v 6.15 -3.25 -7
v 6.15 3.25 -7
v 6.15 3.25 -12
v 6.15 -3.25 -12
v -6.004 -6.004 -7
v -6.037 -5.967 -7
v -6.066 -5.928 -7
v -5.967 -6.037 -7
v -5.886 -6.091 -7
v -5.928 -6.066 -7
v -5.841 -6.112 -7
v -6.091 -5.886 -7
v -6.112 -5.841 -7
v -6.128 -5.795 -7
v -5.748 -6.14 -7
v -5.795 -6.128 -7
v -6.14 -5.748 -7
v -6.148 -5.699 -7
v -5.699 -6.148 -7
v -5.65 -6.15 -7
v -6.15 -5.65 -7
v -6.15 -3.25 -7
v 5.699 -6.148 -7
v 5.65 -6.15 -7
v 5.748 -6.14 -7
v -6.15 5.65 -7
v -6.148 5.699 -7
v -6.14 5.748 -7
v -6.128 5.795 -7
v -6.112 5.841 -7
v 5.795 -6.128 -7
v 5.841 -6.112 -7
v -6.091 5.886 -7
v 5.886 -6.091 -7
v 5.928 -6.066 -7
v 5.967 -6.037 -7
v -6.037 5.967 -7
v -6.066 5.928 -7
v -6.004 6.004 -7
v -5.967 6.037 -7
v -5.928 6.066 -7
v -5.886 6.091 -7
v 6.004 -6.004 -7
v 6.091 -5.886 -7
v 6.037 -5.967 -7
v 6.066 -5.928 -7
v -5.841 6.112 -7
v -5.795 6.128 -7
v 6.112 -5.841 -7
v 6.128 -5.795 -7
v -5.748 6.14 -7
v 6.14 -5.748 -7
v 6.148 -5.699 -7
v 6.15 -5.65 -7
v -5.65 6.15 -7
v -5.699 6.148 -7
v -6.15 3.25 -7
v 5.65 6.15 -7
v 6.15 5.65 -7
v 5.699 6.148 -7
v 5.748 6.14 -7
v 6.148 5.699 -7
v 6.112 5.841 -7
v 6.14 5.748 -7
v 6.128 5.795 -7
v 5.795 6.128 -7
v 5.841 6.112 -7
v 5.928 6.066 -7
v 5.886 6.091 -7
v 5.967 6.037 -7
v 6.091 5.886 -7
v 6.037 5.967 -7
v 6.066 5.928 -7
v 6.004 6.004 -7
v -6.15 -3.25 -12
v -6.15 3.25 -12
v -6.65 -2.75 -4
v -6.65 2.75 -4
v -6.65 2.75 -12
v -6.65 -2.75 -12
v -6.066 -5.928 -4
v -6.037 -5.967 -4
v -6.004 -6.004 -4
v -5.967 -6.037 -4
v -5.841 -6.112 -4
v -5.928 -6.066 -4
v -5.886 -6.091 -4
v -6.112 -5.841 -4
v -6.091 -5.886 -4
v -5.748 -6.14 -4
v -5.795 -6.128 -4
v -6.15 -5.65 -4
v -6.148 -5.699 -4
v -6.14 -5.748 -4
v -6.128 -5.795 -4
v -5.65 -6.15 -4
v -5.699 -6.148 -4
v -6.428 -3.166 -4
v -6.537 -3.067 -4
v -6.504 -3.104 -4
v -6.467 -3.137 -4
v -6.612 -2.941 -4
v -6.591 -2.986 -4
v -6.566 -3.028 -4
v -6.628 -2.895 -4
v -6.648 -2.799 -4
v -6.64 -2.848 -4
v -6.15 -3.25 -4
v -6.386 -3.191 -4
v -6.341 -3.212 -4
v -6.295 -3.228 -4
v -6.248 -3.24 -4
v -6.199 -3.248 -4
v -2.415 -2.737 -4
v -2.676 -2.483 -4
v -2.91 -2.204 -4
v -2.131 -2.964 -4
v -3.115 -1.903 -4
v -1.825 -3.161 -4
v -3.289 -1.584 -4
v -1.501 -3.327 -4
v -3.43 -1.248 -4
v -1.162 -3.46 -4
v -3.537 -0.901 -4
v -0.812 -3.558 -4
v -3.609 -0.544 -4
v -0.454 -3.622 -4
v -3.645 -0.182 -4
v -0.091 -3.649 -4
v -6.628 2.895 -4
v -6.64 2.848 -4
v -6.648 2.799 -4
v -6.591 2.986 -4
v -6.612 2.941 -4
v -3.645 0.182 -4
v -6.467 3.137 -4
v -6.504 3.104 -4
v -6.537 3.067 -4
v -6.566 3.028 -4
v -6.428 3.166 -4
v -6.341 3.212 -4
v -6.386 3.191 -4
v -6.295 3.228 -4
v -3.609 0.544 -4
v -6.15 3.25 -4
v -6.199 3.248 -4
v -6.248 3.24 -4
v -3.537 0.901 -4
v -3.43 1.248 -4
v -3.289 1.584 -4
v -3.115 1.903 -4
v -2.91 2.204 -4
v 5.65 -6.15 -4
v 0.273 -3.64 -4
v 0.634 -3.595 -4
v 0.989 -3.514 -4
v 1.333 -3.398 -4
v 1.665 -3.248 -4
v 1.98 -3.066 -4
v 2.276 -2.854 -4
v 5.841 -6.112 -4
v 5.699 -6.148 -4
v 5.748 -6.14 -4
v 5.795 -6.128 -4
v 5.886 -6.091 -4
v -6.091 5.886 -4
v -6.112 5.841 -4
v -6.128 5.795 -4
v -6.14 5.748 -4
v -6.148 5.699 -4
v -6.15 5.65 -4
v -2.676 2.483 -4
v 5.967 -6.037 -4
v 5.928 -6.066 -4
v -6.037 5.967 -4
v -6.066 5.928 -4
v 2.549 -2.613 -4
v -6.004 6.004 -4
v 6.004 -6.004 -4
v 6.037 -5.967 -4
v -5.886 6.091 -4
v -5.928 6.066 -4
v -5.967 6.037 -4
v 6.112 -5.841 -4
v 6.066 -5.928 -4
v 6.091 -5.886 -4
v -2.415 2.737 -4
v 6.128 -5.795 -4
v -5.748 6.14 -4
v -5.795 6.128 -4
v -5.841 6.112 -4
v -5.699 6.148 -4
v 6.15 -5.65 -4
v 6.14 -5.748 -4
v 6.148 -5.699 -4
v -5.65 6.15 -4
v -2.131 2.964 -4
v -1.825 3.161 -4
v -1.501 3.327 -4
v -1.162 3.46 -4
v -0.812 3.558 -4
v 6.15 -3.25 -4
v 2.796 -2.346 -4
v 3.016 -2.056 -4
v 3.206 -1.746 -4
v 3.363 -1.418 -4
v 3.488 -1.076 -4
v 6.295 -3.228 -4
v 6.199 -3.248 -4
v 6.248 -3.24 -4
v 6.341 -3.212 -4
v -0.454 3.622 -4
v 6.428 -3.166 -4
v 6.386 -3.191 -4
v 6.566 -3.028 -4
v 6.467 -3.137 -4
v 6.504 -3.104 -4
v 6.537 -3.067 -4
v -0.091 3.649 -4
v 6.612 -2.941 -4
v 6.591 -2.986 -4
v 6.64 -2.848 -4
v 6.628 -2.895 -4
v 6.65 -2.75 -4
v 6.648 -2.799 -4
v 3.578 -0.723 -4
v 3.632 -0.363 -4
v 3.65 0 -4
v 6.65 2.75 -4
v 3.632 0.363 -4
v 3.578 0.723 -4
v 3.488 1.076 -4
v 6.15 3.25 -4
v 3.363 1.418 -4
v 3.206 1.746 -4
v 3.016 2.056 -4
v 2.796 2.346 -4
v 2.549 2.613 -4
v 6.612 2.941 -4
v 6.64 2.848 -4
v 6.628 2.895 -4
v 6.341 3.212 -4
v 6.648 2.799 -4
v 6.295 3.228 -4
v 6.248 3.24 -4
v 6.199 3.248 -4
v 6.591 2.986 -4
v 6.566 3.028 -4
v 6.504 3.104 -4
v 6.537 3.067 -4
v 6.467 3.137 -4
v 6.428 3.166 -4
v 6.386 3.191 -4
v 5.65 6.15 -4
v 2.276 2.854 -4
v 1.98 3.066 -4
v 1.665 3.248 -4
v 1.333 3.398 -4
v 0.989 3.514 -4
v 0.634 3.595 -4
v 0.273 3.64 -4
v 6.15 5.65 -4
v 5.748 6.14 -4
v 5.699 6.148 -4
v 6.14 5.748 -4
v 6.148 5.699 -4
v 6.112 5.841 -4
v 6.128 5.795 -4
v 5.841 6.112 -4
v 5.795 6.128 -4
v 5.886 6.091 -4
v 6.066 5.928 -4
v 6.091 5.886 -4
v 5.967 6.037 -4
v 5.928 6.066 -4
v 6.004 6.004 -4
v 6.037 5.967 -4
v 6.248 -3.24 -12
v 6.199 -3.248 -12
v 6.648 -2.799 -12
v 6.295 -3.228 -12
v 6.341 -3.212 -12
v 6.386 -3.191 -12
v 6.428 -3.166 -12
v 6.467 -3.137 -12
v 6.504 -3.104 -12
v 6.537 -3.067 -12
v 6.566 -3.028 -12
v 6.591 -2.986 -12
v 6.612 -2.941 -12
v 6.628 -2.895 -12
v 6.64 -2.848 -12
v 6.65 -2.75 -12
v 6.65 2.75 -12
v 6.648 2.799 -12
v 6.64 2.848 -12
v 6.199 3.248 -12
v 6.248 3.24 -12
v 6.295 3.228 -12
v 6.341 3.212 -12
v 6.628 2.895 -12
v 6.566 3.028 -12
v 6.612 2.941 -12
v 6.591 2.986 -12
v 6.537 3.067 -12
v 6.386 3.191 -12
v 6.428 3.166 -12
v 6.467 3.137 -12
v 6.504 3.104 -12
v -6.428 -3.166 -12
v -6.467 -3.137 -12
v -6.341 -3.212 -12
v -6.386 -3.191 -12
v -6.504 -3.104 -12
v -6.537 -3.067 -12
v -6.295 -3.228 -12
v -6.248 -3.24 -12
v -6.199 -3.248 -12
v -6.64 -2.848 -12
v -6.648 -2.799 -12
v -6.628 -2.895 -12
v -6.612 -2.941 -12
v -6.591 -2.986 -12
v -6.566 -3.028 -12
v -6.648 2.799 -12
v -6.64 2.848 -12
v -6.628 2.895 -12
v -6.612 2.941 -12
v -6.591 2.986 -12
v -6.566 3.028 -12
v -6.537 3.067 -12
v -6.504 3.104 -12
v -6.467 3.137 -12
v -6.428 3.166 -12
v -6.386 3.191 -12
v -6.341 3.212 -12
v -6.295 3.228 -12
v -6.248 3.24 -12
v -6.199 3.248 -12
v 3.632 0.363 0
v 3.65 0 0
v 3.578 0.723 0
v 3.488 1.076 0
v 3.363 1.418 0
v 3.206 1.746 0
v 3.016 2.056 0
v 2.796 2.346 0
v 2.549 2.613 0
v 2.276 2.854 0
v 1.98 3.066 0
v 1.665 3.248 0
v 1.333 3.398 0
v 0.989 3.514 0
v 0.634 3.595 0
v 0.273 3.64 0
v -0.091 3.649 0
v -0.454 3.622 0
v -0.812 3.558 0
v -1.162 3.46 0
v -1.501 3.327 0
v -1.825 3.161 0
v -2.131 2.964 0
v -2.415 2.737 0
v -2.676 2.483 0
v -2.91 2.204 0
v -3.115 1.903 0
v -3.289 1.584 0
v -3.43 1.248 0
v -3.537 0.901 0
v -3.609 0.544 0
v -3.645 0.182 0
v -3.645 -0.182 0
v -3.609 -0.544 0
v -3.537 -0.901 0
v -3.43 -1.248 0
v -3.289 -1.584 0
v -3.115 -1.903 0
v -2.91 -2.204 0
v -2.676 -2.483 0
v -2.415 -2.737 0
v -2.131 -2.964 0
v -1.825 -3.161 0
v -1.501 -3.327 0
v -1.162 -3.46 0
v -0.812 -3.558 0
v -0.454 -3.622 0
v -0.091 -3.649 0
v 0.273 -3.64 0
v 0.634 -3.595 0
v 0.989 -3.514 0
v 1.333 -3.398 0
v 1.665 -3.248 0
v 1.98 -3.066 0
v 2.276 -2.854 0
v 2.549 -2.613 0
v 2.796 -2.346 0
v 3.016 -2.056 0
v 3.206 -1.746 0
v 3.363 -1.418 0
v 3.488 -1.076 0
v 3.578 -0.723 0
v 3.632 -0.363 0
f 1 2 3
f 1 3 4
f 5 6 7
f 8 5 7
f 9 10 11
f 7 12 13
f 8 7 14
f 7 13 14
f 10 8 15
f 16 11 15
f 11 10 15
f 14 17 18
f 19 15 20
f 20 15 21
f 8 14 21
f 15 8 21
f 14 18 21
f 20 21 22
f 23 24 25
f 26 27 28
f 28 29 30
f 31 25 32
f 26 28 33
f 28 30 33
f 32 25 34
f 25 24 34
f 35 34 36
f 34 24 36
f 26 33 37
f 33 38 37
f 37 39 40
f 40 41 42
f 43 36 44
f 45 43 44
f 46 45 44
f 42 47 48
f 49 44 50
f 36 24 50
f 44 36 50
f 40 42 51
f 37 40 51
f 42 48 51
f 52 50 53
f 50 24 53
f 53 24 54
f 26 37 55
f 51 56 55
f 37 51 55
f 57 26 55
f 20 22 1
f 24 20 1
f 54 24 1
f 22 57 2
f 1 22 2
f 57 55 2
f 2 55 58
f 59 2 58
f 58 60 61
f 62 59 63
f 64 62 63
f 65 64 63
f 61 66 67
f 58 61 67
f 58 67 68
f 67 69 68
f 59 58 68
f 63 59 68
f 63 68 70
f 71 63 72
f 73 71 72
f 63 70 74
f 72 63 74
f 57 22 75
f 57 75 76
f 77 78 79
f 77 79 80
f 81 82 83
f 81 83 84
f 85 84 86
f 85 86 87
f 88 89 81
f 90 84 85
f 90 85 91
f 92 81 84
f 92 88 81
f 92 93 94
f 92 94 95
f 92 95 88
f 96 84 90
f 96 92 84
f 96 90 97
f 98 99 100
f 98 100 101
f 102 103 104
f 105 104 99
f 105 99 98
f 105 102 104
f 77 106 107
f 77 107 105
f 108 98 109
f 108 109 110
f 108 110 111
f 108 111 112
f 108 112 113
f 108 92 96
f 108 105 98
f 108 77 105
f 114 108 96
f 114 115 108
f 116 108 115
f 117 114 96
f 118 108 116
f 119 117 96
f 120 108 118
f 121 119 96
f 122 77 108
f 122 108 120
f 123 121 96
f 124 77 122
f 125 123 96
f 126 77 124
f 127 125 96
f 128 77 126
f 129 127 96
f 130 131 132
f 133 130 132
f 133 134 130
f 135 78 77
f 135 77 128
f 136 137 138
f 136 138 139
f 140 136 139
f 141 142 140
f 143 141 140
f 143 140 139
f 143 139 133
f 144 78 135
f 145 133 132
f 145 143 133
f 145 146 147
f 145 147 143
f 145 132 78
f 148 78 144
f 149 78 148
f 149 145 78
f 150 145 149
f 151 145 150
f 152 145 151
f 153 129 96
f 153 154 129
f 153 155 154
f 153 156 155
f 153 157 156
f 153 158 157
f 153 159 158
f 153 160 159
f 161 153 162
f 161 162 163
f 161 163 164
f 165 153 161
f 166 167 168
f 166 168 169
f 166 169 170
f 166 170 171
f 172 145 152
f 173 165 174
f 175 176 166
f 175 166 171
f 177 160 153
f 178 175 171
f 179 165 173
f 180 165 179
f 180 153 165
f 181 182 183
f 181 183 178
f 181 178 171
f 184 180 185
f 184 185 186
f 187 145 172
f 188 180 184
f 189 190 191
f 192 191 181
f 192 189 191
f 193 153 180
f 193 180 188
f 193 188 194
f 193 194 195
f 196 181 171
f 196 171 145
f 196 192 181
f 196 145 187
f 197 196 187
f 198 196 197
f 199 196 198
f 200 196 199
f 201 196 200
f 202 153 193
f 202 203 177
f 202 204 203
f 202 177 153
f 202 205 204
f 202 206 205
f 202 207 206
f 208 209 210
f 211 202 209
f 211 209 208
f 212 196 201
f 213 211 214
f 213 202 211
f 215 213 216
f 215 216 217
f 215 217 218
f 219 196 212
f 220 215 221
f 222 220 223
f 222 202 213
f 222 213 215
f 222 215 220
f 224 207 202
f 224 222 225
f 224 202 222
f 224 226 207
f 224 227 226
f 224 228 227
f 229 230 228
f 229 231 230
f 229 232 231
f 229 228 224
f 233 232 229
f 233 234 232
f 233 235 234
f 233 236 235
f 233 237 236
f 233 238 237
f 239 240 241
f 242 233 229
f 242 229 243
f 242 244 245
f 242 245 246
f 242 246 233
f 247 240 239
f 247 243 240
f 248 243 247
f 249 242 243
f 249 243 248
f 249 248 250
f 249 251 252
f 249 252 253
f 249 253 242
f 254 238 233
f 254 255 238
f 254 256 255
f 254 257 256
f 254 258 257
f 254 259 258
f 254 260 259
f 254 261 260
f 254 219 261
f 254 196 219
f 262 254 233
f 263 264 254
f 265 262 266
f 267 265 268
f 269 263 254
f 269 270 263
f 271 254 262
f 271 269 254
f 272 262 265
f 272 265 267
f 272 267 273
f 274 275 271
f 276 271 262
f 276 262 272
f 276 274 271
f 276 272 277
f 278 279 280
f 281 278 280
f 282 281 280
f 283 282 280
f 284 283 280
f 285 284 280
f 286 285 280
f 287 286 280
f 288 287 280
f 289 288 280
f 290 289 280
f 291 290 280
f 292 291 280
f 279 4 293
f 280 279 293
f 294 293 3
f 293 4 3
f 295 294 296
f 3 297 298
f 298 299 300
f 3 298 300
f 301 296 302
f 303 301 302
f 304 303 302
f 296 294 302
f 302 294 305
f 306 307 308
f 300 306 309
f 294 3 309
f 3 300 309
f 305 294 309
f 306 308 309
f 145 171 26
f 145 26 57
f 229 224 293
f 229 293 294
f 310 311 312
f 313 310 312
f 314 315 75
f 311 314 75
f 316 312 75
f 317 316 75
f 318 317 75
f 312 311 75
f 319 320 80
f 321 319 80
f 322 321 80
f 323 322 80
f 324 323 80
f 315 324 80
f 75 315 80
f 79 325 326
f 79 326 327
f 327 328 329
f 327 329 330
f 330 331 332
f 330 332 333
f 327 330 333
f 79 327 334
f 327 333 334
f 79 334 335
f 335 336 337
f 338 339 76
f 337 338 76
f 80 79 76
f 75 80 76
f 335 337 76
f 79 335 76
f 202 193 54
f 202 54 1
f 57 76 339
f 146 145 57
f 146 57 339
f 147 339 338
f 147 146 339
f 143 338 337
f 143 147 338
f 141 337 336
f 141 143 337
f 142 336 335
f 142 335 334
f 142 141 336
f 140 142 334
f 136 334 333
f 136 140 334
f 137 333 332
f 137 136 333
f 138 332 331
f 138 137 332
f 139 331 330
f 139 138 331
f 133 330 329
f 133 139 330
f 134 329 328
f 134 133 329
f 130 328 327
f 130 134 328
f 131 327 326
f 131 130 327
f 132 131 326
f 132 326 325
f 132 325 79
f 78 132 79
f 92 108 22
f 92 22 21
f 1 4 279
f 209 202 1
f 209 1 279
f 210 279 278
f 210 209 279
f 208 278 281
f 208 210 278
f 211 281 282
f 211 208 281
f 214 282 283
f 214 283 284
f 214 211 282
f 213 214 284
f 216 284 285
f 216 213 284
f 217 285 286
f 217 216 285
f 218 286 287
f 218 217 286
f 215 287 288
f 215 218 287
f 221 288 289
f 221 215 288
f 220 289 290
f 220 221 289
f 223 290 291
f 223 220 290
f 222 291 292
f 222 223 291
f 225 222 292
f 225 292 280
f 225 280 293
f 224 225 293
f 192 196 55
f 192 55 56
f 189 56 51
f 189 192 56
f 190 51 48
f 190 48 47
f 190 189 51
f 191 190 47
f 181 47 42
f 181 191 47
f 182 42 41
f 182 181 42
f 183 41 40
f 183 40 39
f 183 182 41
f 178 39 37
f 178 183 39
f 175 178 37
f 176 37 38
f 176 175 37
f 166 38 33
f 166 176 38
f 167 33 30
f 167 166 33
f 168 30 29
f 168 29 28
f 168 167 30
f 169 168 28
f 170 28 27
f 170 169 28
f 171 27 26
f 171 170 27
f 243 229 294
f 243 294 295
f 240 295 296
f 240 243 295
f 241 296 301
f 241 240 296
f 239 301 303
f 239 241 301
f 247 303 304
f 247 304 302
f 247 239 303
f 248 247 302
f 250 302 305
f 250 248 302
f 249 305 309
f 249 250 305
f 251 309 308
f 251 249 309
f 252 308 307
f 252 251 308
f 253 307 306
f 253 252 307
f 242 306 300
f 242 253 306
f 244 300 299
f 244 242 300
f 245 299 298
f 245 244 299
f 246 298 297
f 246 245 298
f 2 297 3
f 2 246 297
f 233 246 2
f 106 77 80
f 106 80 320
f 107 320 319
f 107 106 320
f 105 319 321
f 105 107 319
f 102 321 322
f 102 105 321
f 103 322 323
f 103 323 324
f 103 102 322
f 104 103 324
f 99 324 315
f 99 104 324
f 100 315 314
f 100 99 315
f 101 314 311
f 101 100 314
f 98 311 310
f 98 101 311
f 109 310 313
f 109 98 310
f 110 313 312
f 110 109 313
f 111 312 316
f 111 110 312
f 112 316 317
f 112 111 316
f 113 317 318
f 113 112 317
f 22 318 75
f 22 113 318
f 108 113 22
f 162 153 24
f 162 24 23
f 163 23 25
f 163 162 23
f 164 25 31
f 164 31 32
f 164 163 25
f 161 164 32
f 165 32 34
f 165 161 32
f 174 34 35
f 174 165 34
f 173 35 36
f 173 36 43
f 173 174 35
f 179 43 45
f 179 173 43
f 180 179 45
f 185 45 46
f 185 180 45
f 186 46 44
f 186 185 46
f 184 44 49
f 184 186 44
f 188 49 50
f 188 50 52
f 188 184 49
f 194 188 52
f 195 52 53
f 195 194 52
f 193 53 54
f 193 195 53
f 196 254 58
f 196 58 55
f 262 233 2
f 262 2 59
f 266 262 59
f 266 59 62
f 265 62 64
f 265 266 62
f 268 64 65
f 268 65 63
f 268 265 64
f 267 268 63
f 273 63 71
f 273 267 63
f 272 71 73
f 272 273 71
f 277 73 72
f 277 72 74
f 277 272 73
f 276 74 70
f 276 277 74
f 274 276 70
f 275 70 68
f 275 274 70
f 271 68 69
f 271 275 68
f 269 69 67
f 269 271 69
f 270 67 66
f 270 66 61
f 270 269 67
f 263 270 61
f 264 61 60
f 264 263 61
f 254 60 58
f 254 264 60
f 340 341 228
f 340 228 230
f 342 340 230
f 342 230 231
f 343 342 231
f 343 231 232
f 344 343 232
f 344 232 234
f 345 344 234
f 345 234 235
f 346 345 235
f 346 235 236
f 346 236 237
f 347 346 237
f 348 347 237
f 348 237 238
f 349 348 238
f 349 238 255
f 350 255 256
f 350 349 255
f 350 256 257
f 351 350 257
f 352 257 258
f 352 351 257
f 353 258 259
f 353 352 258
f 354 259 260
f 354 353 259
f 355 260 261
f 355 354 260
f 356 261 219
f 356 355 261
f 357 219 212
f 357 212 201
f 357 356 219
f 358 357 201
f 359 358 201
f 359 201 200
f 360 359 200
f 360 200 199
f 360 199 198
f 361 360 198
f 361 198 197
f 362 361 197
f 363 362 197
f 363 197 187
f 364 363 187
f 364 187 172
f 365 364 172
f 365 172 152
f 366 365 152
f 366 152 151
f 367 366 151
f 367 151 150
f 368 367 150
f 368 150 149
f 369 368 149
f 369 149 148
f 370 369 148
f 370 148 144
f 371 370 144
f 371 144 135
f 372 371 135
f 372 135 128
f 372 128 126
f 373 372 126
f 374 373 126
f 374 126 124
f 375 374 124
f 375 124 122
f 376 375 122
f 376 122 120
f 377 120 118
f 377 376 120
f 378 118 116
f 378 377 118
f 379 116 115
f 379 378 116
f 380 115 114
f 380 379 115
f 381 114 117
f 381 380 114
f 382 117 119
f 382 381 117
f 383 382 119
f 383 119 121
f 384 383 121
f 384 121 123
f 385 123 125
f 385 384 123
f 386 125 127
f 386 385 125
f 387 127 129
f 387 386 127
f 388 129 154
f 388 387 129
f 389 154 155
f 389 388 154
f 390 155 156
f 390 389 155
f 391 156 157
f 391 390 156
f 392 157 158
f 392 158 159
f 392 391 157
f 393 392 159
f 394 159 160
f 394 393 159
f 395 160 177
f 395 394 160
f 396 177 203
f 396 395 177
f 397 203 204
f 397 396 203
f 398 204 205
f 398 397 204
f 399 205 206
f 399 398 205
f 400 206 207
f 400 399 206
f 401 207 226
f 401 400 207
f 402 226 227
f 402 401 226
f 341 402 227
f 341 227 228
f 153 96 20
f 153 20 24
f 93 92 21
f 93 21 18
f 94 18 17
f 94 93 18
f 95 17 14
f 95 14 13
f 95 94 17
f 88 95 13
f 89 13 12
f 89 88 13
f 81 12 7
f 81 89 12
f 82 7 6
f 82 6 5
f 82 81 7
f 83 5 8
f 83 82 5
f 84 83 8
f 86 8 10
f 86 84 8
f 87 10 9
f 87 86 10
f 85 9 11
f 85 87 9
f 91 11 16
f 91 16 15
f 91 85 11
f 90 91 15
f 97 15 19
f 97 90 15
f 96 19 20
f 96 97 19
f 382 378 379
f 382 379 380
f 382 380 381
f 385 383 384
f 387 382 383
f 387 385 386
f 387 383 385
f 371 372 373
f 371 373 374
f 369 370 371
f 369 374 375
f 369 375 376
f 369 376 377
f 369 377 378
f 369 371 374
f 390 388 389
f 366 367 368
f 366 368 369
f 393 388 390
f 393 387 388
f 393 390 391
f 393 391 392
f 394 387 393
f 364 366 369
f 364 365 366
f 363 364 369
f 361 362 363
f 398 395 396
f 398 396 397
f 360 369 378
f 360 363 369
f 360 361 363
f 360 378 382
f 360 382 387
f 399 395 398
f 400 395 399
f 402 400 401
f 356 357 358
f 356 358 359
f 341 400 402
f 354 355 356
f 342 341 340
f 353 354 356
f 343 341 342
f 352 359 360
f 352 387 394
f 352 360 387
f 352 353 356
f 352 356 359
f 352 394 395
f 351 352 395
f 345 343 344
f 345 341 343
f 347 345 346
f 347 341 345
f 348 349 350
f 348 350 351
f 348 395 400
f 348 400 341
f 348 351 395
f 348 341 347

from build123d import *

# Parameters (mm, degrees)
F0_R     = 3.65
F1_DEPTH = 7
F2_START = -4
F2_DEPTH = 3
F3_START = -4
F3_DEPTH = 8


with BuildPart() as f1:
    # F0 (on Top) → F1 (new body)
    with BuildSketch(Plane.XY):
        Circle(F0_R)
    extrude(amount=-F1_DEPTH)

    # F0 (on Top) → F2 (join)
    with BuildSketch(Plane.XY.offset(F2_START)):
        with BuildLine():
            ThreePointArc((-6.15, -5.65), (-6.0035533906, -6.0035533906), (-5.65, -6.15))
            Line((-5.65, -6.15), (5.65, -6.15))
            ThreePointArc((5.65, -6.15), (6.0035533906, -6.0035533906), (6.15, -5.65))
            Line((6.15, -5.65), (6.15, -3.25))
            Line((6.15, -3.25), (6.15, 3.25))
            Line((6.15, 3.25), (6.15, 5.65))
            ThreePointArc((6.15, 5.65), (6.0035533906, 6.0035533906), (5.65, 6.15))
            Line((5.65, 6.15), (-5.65, 6.15))
            ThreePointArc((-5.65, 6.15), (-6.0035533906, 6.0035533906), (-6.15, 5.65))
            Line((-6.15, 5.65), (-6.15, 3.25))
            Line((-6.15, 3.25), (-6.15, -3.25))
            Line((-6.15, -3.25), (-6.15, -5.65))
        make_face()
        Circle(F0_R, mode=Mode.SUBTRACT)
    extrude(amount=-F2_DEPTH)

    # F0 (on Top) → F3 (join)
    with BuildSketch(Plane.XY.offset(F3_START)):
        with BuildLine():
            ThreePointArc((-6.65, -2.75), (-6.5035533906, -3.1035533906), (-6.15, -3.25))
            Line((-6.15, -3.25), (-6.15, 3.25))
            ThreePointArc((-6.15, 3.25), (-6.5035533906, 3.1035533906), (-6.65, 2.75))
            Line((-6.65, 2.75), (-6.65, 0))
            Line((-6.65, 0), (-6.65, -2.75))
        make_face()
        with BuildLine():
            Line((6.15, 3.25), (6.15, -3.25))
            ThreePointArc((6.15, -3.25), (6.5035533906, -3.1035533906), (6.65, -2.75))
            Line((6.65, -2.75), (6.65, 0))
            Line((6.65, 0), (6.65, 2.75))
            ThreePointArc((6.65, 2.75), (6.5035533906, 3.1035533906), (6.15, 3.25))
        make_face()
    extrude(amount=-F3_DEPTH)


solid = f1.part
